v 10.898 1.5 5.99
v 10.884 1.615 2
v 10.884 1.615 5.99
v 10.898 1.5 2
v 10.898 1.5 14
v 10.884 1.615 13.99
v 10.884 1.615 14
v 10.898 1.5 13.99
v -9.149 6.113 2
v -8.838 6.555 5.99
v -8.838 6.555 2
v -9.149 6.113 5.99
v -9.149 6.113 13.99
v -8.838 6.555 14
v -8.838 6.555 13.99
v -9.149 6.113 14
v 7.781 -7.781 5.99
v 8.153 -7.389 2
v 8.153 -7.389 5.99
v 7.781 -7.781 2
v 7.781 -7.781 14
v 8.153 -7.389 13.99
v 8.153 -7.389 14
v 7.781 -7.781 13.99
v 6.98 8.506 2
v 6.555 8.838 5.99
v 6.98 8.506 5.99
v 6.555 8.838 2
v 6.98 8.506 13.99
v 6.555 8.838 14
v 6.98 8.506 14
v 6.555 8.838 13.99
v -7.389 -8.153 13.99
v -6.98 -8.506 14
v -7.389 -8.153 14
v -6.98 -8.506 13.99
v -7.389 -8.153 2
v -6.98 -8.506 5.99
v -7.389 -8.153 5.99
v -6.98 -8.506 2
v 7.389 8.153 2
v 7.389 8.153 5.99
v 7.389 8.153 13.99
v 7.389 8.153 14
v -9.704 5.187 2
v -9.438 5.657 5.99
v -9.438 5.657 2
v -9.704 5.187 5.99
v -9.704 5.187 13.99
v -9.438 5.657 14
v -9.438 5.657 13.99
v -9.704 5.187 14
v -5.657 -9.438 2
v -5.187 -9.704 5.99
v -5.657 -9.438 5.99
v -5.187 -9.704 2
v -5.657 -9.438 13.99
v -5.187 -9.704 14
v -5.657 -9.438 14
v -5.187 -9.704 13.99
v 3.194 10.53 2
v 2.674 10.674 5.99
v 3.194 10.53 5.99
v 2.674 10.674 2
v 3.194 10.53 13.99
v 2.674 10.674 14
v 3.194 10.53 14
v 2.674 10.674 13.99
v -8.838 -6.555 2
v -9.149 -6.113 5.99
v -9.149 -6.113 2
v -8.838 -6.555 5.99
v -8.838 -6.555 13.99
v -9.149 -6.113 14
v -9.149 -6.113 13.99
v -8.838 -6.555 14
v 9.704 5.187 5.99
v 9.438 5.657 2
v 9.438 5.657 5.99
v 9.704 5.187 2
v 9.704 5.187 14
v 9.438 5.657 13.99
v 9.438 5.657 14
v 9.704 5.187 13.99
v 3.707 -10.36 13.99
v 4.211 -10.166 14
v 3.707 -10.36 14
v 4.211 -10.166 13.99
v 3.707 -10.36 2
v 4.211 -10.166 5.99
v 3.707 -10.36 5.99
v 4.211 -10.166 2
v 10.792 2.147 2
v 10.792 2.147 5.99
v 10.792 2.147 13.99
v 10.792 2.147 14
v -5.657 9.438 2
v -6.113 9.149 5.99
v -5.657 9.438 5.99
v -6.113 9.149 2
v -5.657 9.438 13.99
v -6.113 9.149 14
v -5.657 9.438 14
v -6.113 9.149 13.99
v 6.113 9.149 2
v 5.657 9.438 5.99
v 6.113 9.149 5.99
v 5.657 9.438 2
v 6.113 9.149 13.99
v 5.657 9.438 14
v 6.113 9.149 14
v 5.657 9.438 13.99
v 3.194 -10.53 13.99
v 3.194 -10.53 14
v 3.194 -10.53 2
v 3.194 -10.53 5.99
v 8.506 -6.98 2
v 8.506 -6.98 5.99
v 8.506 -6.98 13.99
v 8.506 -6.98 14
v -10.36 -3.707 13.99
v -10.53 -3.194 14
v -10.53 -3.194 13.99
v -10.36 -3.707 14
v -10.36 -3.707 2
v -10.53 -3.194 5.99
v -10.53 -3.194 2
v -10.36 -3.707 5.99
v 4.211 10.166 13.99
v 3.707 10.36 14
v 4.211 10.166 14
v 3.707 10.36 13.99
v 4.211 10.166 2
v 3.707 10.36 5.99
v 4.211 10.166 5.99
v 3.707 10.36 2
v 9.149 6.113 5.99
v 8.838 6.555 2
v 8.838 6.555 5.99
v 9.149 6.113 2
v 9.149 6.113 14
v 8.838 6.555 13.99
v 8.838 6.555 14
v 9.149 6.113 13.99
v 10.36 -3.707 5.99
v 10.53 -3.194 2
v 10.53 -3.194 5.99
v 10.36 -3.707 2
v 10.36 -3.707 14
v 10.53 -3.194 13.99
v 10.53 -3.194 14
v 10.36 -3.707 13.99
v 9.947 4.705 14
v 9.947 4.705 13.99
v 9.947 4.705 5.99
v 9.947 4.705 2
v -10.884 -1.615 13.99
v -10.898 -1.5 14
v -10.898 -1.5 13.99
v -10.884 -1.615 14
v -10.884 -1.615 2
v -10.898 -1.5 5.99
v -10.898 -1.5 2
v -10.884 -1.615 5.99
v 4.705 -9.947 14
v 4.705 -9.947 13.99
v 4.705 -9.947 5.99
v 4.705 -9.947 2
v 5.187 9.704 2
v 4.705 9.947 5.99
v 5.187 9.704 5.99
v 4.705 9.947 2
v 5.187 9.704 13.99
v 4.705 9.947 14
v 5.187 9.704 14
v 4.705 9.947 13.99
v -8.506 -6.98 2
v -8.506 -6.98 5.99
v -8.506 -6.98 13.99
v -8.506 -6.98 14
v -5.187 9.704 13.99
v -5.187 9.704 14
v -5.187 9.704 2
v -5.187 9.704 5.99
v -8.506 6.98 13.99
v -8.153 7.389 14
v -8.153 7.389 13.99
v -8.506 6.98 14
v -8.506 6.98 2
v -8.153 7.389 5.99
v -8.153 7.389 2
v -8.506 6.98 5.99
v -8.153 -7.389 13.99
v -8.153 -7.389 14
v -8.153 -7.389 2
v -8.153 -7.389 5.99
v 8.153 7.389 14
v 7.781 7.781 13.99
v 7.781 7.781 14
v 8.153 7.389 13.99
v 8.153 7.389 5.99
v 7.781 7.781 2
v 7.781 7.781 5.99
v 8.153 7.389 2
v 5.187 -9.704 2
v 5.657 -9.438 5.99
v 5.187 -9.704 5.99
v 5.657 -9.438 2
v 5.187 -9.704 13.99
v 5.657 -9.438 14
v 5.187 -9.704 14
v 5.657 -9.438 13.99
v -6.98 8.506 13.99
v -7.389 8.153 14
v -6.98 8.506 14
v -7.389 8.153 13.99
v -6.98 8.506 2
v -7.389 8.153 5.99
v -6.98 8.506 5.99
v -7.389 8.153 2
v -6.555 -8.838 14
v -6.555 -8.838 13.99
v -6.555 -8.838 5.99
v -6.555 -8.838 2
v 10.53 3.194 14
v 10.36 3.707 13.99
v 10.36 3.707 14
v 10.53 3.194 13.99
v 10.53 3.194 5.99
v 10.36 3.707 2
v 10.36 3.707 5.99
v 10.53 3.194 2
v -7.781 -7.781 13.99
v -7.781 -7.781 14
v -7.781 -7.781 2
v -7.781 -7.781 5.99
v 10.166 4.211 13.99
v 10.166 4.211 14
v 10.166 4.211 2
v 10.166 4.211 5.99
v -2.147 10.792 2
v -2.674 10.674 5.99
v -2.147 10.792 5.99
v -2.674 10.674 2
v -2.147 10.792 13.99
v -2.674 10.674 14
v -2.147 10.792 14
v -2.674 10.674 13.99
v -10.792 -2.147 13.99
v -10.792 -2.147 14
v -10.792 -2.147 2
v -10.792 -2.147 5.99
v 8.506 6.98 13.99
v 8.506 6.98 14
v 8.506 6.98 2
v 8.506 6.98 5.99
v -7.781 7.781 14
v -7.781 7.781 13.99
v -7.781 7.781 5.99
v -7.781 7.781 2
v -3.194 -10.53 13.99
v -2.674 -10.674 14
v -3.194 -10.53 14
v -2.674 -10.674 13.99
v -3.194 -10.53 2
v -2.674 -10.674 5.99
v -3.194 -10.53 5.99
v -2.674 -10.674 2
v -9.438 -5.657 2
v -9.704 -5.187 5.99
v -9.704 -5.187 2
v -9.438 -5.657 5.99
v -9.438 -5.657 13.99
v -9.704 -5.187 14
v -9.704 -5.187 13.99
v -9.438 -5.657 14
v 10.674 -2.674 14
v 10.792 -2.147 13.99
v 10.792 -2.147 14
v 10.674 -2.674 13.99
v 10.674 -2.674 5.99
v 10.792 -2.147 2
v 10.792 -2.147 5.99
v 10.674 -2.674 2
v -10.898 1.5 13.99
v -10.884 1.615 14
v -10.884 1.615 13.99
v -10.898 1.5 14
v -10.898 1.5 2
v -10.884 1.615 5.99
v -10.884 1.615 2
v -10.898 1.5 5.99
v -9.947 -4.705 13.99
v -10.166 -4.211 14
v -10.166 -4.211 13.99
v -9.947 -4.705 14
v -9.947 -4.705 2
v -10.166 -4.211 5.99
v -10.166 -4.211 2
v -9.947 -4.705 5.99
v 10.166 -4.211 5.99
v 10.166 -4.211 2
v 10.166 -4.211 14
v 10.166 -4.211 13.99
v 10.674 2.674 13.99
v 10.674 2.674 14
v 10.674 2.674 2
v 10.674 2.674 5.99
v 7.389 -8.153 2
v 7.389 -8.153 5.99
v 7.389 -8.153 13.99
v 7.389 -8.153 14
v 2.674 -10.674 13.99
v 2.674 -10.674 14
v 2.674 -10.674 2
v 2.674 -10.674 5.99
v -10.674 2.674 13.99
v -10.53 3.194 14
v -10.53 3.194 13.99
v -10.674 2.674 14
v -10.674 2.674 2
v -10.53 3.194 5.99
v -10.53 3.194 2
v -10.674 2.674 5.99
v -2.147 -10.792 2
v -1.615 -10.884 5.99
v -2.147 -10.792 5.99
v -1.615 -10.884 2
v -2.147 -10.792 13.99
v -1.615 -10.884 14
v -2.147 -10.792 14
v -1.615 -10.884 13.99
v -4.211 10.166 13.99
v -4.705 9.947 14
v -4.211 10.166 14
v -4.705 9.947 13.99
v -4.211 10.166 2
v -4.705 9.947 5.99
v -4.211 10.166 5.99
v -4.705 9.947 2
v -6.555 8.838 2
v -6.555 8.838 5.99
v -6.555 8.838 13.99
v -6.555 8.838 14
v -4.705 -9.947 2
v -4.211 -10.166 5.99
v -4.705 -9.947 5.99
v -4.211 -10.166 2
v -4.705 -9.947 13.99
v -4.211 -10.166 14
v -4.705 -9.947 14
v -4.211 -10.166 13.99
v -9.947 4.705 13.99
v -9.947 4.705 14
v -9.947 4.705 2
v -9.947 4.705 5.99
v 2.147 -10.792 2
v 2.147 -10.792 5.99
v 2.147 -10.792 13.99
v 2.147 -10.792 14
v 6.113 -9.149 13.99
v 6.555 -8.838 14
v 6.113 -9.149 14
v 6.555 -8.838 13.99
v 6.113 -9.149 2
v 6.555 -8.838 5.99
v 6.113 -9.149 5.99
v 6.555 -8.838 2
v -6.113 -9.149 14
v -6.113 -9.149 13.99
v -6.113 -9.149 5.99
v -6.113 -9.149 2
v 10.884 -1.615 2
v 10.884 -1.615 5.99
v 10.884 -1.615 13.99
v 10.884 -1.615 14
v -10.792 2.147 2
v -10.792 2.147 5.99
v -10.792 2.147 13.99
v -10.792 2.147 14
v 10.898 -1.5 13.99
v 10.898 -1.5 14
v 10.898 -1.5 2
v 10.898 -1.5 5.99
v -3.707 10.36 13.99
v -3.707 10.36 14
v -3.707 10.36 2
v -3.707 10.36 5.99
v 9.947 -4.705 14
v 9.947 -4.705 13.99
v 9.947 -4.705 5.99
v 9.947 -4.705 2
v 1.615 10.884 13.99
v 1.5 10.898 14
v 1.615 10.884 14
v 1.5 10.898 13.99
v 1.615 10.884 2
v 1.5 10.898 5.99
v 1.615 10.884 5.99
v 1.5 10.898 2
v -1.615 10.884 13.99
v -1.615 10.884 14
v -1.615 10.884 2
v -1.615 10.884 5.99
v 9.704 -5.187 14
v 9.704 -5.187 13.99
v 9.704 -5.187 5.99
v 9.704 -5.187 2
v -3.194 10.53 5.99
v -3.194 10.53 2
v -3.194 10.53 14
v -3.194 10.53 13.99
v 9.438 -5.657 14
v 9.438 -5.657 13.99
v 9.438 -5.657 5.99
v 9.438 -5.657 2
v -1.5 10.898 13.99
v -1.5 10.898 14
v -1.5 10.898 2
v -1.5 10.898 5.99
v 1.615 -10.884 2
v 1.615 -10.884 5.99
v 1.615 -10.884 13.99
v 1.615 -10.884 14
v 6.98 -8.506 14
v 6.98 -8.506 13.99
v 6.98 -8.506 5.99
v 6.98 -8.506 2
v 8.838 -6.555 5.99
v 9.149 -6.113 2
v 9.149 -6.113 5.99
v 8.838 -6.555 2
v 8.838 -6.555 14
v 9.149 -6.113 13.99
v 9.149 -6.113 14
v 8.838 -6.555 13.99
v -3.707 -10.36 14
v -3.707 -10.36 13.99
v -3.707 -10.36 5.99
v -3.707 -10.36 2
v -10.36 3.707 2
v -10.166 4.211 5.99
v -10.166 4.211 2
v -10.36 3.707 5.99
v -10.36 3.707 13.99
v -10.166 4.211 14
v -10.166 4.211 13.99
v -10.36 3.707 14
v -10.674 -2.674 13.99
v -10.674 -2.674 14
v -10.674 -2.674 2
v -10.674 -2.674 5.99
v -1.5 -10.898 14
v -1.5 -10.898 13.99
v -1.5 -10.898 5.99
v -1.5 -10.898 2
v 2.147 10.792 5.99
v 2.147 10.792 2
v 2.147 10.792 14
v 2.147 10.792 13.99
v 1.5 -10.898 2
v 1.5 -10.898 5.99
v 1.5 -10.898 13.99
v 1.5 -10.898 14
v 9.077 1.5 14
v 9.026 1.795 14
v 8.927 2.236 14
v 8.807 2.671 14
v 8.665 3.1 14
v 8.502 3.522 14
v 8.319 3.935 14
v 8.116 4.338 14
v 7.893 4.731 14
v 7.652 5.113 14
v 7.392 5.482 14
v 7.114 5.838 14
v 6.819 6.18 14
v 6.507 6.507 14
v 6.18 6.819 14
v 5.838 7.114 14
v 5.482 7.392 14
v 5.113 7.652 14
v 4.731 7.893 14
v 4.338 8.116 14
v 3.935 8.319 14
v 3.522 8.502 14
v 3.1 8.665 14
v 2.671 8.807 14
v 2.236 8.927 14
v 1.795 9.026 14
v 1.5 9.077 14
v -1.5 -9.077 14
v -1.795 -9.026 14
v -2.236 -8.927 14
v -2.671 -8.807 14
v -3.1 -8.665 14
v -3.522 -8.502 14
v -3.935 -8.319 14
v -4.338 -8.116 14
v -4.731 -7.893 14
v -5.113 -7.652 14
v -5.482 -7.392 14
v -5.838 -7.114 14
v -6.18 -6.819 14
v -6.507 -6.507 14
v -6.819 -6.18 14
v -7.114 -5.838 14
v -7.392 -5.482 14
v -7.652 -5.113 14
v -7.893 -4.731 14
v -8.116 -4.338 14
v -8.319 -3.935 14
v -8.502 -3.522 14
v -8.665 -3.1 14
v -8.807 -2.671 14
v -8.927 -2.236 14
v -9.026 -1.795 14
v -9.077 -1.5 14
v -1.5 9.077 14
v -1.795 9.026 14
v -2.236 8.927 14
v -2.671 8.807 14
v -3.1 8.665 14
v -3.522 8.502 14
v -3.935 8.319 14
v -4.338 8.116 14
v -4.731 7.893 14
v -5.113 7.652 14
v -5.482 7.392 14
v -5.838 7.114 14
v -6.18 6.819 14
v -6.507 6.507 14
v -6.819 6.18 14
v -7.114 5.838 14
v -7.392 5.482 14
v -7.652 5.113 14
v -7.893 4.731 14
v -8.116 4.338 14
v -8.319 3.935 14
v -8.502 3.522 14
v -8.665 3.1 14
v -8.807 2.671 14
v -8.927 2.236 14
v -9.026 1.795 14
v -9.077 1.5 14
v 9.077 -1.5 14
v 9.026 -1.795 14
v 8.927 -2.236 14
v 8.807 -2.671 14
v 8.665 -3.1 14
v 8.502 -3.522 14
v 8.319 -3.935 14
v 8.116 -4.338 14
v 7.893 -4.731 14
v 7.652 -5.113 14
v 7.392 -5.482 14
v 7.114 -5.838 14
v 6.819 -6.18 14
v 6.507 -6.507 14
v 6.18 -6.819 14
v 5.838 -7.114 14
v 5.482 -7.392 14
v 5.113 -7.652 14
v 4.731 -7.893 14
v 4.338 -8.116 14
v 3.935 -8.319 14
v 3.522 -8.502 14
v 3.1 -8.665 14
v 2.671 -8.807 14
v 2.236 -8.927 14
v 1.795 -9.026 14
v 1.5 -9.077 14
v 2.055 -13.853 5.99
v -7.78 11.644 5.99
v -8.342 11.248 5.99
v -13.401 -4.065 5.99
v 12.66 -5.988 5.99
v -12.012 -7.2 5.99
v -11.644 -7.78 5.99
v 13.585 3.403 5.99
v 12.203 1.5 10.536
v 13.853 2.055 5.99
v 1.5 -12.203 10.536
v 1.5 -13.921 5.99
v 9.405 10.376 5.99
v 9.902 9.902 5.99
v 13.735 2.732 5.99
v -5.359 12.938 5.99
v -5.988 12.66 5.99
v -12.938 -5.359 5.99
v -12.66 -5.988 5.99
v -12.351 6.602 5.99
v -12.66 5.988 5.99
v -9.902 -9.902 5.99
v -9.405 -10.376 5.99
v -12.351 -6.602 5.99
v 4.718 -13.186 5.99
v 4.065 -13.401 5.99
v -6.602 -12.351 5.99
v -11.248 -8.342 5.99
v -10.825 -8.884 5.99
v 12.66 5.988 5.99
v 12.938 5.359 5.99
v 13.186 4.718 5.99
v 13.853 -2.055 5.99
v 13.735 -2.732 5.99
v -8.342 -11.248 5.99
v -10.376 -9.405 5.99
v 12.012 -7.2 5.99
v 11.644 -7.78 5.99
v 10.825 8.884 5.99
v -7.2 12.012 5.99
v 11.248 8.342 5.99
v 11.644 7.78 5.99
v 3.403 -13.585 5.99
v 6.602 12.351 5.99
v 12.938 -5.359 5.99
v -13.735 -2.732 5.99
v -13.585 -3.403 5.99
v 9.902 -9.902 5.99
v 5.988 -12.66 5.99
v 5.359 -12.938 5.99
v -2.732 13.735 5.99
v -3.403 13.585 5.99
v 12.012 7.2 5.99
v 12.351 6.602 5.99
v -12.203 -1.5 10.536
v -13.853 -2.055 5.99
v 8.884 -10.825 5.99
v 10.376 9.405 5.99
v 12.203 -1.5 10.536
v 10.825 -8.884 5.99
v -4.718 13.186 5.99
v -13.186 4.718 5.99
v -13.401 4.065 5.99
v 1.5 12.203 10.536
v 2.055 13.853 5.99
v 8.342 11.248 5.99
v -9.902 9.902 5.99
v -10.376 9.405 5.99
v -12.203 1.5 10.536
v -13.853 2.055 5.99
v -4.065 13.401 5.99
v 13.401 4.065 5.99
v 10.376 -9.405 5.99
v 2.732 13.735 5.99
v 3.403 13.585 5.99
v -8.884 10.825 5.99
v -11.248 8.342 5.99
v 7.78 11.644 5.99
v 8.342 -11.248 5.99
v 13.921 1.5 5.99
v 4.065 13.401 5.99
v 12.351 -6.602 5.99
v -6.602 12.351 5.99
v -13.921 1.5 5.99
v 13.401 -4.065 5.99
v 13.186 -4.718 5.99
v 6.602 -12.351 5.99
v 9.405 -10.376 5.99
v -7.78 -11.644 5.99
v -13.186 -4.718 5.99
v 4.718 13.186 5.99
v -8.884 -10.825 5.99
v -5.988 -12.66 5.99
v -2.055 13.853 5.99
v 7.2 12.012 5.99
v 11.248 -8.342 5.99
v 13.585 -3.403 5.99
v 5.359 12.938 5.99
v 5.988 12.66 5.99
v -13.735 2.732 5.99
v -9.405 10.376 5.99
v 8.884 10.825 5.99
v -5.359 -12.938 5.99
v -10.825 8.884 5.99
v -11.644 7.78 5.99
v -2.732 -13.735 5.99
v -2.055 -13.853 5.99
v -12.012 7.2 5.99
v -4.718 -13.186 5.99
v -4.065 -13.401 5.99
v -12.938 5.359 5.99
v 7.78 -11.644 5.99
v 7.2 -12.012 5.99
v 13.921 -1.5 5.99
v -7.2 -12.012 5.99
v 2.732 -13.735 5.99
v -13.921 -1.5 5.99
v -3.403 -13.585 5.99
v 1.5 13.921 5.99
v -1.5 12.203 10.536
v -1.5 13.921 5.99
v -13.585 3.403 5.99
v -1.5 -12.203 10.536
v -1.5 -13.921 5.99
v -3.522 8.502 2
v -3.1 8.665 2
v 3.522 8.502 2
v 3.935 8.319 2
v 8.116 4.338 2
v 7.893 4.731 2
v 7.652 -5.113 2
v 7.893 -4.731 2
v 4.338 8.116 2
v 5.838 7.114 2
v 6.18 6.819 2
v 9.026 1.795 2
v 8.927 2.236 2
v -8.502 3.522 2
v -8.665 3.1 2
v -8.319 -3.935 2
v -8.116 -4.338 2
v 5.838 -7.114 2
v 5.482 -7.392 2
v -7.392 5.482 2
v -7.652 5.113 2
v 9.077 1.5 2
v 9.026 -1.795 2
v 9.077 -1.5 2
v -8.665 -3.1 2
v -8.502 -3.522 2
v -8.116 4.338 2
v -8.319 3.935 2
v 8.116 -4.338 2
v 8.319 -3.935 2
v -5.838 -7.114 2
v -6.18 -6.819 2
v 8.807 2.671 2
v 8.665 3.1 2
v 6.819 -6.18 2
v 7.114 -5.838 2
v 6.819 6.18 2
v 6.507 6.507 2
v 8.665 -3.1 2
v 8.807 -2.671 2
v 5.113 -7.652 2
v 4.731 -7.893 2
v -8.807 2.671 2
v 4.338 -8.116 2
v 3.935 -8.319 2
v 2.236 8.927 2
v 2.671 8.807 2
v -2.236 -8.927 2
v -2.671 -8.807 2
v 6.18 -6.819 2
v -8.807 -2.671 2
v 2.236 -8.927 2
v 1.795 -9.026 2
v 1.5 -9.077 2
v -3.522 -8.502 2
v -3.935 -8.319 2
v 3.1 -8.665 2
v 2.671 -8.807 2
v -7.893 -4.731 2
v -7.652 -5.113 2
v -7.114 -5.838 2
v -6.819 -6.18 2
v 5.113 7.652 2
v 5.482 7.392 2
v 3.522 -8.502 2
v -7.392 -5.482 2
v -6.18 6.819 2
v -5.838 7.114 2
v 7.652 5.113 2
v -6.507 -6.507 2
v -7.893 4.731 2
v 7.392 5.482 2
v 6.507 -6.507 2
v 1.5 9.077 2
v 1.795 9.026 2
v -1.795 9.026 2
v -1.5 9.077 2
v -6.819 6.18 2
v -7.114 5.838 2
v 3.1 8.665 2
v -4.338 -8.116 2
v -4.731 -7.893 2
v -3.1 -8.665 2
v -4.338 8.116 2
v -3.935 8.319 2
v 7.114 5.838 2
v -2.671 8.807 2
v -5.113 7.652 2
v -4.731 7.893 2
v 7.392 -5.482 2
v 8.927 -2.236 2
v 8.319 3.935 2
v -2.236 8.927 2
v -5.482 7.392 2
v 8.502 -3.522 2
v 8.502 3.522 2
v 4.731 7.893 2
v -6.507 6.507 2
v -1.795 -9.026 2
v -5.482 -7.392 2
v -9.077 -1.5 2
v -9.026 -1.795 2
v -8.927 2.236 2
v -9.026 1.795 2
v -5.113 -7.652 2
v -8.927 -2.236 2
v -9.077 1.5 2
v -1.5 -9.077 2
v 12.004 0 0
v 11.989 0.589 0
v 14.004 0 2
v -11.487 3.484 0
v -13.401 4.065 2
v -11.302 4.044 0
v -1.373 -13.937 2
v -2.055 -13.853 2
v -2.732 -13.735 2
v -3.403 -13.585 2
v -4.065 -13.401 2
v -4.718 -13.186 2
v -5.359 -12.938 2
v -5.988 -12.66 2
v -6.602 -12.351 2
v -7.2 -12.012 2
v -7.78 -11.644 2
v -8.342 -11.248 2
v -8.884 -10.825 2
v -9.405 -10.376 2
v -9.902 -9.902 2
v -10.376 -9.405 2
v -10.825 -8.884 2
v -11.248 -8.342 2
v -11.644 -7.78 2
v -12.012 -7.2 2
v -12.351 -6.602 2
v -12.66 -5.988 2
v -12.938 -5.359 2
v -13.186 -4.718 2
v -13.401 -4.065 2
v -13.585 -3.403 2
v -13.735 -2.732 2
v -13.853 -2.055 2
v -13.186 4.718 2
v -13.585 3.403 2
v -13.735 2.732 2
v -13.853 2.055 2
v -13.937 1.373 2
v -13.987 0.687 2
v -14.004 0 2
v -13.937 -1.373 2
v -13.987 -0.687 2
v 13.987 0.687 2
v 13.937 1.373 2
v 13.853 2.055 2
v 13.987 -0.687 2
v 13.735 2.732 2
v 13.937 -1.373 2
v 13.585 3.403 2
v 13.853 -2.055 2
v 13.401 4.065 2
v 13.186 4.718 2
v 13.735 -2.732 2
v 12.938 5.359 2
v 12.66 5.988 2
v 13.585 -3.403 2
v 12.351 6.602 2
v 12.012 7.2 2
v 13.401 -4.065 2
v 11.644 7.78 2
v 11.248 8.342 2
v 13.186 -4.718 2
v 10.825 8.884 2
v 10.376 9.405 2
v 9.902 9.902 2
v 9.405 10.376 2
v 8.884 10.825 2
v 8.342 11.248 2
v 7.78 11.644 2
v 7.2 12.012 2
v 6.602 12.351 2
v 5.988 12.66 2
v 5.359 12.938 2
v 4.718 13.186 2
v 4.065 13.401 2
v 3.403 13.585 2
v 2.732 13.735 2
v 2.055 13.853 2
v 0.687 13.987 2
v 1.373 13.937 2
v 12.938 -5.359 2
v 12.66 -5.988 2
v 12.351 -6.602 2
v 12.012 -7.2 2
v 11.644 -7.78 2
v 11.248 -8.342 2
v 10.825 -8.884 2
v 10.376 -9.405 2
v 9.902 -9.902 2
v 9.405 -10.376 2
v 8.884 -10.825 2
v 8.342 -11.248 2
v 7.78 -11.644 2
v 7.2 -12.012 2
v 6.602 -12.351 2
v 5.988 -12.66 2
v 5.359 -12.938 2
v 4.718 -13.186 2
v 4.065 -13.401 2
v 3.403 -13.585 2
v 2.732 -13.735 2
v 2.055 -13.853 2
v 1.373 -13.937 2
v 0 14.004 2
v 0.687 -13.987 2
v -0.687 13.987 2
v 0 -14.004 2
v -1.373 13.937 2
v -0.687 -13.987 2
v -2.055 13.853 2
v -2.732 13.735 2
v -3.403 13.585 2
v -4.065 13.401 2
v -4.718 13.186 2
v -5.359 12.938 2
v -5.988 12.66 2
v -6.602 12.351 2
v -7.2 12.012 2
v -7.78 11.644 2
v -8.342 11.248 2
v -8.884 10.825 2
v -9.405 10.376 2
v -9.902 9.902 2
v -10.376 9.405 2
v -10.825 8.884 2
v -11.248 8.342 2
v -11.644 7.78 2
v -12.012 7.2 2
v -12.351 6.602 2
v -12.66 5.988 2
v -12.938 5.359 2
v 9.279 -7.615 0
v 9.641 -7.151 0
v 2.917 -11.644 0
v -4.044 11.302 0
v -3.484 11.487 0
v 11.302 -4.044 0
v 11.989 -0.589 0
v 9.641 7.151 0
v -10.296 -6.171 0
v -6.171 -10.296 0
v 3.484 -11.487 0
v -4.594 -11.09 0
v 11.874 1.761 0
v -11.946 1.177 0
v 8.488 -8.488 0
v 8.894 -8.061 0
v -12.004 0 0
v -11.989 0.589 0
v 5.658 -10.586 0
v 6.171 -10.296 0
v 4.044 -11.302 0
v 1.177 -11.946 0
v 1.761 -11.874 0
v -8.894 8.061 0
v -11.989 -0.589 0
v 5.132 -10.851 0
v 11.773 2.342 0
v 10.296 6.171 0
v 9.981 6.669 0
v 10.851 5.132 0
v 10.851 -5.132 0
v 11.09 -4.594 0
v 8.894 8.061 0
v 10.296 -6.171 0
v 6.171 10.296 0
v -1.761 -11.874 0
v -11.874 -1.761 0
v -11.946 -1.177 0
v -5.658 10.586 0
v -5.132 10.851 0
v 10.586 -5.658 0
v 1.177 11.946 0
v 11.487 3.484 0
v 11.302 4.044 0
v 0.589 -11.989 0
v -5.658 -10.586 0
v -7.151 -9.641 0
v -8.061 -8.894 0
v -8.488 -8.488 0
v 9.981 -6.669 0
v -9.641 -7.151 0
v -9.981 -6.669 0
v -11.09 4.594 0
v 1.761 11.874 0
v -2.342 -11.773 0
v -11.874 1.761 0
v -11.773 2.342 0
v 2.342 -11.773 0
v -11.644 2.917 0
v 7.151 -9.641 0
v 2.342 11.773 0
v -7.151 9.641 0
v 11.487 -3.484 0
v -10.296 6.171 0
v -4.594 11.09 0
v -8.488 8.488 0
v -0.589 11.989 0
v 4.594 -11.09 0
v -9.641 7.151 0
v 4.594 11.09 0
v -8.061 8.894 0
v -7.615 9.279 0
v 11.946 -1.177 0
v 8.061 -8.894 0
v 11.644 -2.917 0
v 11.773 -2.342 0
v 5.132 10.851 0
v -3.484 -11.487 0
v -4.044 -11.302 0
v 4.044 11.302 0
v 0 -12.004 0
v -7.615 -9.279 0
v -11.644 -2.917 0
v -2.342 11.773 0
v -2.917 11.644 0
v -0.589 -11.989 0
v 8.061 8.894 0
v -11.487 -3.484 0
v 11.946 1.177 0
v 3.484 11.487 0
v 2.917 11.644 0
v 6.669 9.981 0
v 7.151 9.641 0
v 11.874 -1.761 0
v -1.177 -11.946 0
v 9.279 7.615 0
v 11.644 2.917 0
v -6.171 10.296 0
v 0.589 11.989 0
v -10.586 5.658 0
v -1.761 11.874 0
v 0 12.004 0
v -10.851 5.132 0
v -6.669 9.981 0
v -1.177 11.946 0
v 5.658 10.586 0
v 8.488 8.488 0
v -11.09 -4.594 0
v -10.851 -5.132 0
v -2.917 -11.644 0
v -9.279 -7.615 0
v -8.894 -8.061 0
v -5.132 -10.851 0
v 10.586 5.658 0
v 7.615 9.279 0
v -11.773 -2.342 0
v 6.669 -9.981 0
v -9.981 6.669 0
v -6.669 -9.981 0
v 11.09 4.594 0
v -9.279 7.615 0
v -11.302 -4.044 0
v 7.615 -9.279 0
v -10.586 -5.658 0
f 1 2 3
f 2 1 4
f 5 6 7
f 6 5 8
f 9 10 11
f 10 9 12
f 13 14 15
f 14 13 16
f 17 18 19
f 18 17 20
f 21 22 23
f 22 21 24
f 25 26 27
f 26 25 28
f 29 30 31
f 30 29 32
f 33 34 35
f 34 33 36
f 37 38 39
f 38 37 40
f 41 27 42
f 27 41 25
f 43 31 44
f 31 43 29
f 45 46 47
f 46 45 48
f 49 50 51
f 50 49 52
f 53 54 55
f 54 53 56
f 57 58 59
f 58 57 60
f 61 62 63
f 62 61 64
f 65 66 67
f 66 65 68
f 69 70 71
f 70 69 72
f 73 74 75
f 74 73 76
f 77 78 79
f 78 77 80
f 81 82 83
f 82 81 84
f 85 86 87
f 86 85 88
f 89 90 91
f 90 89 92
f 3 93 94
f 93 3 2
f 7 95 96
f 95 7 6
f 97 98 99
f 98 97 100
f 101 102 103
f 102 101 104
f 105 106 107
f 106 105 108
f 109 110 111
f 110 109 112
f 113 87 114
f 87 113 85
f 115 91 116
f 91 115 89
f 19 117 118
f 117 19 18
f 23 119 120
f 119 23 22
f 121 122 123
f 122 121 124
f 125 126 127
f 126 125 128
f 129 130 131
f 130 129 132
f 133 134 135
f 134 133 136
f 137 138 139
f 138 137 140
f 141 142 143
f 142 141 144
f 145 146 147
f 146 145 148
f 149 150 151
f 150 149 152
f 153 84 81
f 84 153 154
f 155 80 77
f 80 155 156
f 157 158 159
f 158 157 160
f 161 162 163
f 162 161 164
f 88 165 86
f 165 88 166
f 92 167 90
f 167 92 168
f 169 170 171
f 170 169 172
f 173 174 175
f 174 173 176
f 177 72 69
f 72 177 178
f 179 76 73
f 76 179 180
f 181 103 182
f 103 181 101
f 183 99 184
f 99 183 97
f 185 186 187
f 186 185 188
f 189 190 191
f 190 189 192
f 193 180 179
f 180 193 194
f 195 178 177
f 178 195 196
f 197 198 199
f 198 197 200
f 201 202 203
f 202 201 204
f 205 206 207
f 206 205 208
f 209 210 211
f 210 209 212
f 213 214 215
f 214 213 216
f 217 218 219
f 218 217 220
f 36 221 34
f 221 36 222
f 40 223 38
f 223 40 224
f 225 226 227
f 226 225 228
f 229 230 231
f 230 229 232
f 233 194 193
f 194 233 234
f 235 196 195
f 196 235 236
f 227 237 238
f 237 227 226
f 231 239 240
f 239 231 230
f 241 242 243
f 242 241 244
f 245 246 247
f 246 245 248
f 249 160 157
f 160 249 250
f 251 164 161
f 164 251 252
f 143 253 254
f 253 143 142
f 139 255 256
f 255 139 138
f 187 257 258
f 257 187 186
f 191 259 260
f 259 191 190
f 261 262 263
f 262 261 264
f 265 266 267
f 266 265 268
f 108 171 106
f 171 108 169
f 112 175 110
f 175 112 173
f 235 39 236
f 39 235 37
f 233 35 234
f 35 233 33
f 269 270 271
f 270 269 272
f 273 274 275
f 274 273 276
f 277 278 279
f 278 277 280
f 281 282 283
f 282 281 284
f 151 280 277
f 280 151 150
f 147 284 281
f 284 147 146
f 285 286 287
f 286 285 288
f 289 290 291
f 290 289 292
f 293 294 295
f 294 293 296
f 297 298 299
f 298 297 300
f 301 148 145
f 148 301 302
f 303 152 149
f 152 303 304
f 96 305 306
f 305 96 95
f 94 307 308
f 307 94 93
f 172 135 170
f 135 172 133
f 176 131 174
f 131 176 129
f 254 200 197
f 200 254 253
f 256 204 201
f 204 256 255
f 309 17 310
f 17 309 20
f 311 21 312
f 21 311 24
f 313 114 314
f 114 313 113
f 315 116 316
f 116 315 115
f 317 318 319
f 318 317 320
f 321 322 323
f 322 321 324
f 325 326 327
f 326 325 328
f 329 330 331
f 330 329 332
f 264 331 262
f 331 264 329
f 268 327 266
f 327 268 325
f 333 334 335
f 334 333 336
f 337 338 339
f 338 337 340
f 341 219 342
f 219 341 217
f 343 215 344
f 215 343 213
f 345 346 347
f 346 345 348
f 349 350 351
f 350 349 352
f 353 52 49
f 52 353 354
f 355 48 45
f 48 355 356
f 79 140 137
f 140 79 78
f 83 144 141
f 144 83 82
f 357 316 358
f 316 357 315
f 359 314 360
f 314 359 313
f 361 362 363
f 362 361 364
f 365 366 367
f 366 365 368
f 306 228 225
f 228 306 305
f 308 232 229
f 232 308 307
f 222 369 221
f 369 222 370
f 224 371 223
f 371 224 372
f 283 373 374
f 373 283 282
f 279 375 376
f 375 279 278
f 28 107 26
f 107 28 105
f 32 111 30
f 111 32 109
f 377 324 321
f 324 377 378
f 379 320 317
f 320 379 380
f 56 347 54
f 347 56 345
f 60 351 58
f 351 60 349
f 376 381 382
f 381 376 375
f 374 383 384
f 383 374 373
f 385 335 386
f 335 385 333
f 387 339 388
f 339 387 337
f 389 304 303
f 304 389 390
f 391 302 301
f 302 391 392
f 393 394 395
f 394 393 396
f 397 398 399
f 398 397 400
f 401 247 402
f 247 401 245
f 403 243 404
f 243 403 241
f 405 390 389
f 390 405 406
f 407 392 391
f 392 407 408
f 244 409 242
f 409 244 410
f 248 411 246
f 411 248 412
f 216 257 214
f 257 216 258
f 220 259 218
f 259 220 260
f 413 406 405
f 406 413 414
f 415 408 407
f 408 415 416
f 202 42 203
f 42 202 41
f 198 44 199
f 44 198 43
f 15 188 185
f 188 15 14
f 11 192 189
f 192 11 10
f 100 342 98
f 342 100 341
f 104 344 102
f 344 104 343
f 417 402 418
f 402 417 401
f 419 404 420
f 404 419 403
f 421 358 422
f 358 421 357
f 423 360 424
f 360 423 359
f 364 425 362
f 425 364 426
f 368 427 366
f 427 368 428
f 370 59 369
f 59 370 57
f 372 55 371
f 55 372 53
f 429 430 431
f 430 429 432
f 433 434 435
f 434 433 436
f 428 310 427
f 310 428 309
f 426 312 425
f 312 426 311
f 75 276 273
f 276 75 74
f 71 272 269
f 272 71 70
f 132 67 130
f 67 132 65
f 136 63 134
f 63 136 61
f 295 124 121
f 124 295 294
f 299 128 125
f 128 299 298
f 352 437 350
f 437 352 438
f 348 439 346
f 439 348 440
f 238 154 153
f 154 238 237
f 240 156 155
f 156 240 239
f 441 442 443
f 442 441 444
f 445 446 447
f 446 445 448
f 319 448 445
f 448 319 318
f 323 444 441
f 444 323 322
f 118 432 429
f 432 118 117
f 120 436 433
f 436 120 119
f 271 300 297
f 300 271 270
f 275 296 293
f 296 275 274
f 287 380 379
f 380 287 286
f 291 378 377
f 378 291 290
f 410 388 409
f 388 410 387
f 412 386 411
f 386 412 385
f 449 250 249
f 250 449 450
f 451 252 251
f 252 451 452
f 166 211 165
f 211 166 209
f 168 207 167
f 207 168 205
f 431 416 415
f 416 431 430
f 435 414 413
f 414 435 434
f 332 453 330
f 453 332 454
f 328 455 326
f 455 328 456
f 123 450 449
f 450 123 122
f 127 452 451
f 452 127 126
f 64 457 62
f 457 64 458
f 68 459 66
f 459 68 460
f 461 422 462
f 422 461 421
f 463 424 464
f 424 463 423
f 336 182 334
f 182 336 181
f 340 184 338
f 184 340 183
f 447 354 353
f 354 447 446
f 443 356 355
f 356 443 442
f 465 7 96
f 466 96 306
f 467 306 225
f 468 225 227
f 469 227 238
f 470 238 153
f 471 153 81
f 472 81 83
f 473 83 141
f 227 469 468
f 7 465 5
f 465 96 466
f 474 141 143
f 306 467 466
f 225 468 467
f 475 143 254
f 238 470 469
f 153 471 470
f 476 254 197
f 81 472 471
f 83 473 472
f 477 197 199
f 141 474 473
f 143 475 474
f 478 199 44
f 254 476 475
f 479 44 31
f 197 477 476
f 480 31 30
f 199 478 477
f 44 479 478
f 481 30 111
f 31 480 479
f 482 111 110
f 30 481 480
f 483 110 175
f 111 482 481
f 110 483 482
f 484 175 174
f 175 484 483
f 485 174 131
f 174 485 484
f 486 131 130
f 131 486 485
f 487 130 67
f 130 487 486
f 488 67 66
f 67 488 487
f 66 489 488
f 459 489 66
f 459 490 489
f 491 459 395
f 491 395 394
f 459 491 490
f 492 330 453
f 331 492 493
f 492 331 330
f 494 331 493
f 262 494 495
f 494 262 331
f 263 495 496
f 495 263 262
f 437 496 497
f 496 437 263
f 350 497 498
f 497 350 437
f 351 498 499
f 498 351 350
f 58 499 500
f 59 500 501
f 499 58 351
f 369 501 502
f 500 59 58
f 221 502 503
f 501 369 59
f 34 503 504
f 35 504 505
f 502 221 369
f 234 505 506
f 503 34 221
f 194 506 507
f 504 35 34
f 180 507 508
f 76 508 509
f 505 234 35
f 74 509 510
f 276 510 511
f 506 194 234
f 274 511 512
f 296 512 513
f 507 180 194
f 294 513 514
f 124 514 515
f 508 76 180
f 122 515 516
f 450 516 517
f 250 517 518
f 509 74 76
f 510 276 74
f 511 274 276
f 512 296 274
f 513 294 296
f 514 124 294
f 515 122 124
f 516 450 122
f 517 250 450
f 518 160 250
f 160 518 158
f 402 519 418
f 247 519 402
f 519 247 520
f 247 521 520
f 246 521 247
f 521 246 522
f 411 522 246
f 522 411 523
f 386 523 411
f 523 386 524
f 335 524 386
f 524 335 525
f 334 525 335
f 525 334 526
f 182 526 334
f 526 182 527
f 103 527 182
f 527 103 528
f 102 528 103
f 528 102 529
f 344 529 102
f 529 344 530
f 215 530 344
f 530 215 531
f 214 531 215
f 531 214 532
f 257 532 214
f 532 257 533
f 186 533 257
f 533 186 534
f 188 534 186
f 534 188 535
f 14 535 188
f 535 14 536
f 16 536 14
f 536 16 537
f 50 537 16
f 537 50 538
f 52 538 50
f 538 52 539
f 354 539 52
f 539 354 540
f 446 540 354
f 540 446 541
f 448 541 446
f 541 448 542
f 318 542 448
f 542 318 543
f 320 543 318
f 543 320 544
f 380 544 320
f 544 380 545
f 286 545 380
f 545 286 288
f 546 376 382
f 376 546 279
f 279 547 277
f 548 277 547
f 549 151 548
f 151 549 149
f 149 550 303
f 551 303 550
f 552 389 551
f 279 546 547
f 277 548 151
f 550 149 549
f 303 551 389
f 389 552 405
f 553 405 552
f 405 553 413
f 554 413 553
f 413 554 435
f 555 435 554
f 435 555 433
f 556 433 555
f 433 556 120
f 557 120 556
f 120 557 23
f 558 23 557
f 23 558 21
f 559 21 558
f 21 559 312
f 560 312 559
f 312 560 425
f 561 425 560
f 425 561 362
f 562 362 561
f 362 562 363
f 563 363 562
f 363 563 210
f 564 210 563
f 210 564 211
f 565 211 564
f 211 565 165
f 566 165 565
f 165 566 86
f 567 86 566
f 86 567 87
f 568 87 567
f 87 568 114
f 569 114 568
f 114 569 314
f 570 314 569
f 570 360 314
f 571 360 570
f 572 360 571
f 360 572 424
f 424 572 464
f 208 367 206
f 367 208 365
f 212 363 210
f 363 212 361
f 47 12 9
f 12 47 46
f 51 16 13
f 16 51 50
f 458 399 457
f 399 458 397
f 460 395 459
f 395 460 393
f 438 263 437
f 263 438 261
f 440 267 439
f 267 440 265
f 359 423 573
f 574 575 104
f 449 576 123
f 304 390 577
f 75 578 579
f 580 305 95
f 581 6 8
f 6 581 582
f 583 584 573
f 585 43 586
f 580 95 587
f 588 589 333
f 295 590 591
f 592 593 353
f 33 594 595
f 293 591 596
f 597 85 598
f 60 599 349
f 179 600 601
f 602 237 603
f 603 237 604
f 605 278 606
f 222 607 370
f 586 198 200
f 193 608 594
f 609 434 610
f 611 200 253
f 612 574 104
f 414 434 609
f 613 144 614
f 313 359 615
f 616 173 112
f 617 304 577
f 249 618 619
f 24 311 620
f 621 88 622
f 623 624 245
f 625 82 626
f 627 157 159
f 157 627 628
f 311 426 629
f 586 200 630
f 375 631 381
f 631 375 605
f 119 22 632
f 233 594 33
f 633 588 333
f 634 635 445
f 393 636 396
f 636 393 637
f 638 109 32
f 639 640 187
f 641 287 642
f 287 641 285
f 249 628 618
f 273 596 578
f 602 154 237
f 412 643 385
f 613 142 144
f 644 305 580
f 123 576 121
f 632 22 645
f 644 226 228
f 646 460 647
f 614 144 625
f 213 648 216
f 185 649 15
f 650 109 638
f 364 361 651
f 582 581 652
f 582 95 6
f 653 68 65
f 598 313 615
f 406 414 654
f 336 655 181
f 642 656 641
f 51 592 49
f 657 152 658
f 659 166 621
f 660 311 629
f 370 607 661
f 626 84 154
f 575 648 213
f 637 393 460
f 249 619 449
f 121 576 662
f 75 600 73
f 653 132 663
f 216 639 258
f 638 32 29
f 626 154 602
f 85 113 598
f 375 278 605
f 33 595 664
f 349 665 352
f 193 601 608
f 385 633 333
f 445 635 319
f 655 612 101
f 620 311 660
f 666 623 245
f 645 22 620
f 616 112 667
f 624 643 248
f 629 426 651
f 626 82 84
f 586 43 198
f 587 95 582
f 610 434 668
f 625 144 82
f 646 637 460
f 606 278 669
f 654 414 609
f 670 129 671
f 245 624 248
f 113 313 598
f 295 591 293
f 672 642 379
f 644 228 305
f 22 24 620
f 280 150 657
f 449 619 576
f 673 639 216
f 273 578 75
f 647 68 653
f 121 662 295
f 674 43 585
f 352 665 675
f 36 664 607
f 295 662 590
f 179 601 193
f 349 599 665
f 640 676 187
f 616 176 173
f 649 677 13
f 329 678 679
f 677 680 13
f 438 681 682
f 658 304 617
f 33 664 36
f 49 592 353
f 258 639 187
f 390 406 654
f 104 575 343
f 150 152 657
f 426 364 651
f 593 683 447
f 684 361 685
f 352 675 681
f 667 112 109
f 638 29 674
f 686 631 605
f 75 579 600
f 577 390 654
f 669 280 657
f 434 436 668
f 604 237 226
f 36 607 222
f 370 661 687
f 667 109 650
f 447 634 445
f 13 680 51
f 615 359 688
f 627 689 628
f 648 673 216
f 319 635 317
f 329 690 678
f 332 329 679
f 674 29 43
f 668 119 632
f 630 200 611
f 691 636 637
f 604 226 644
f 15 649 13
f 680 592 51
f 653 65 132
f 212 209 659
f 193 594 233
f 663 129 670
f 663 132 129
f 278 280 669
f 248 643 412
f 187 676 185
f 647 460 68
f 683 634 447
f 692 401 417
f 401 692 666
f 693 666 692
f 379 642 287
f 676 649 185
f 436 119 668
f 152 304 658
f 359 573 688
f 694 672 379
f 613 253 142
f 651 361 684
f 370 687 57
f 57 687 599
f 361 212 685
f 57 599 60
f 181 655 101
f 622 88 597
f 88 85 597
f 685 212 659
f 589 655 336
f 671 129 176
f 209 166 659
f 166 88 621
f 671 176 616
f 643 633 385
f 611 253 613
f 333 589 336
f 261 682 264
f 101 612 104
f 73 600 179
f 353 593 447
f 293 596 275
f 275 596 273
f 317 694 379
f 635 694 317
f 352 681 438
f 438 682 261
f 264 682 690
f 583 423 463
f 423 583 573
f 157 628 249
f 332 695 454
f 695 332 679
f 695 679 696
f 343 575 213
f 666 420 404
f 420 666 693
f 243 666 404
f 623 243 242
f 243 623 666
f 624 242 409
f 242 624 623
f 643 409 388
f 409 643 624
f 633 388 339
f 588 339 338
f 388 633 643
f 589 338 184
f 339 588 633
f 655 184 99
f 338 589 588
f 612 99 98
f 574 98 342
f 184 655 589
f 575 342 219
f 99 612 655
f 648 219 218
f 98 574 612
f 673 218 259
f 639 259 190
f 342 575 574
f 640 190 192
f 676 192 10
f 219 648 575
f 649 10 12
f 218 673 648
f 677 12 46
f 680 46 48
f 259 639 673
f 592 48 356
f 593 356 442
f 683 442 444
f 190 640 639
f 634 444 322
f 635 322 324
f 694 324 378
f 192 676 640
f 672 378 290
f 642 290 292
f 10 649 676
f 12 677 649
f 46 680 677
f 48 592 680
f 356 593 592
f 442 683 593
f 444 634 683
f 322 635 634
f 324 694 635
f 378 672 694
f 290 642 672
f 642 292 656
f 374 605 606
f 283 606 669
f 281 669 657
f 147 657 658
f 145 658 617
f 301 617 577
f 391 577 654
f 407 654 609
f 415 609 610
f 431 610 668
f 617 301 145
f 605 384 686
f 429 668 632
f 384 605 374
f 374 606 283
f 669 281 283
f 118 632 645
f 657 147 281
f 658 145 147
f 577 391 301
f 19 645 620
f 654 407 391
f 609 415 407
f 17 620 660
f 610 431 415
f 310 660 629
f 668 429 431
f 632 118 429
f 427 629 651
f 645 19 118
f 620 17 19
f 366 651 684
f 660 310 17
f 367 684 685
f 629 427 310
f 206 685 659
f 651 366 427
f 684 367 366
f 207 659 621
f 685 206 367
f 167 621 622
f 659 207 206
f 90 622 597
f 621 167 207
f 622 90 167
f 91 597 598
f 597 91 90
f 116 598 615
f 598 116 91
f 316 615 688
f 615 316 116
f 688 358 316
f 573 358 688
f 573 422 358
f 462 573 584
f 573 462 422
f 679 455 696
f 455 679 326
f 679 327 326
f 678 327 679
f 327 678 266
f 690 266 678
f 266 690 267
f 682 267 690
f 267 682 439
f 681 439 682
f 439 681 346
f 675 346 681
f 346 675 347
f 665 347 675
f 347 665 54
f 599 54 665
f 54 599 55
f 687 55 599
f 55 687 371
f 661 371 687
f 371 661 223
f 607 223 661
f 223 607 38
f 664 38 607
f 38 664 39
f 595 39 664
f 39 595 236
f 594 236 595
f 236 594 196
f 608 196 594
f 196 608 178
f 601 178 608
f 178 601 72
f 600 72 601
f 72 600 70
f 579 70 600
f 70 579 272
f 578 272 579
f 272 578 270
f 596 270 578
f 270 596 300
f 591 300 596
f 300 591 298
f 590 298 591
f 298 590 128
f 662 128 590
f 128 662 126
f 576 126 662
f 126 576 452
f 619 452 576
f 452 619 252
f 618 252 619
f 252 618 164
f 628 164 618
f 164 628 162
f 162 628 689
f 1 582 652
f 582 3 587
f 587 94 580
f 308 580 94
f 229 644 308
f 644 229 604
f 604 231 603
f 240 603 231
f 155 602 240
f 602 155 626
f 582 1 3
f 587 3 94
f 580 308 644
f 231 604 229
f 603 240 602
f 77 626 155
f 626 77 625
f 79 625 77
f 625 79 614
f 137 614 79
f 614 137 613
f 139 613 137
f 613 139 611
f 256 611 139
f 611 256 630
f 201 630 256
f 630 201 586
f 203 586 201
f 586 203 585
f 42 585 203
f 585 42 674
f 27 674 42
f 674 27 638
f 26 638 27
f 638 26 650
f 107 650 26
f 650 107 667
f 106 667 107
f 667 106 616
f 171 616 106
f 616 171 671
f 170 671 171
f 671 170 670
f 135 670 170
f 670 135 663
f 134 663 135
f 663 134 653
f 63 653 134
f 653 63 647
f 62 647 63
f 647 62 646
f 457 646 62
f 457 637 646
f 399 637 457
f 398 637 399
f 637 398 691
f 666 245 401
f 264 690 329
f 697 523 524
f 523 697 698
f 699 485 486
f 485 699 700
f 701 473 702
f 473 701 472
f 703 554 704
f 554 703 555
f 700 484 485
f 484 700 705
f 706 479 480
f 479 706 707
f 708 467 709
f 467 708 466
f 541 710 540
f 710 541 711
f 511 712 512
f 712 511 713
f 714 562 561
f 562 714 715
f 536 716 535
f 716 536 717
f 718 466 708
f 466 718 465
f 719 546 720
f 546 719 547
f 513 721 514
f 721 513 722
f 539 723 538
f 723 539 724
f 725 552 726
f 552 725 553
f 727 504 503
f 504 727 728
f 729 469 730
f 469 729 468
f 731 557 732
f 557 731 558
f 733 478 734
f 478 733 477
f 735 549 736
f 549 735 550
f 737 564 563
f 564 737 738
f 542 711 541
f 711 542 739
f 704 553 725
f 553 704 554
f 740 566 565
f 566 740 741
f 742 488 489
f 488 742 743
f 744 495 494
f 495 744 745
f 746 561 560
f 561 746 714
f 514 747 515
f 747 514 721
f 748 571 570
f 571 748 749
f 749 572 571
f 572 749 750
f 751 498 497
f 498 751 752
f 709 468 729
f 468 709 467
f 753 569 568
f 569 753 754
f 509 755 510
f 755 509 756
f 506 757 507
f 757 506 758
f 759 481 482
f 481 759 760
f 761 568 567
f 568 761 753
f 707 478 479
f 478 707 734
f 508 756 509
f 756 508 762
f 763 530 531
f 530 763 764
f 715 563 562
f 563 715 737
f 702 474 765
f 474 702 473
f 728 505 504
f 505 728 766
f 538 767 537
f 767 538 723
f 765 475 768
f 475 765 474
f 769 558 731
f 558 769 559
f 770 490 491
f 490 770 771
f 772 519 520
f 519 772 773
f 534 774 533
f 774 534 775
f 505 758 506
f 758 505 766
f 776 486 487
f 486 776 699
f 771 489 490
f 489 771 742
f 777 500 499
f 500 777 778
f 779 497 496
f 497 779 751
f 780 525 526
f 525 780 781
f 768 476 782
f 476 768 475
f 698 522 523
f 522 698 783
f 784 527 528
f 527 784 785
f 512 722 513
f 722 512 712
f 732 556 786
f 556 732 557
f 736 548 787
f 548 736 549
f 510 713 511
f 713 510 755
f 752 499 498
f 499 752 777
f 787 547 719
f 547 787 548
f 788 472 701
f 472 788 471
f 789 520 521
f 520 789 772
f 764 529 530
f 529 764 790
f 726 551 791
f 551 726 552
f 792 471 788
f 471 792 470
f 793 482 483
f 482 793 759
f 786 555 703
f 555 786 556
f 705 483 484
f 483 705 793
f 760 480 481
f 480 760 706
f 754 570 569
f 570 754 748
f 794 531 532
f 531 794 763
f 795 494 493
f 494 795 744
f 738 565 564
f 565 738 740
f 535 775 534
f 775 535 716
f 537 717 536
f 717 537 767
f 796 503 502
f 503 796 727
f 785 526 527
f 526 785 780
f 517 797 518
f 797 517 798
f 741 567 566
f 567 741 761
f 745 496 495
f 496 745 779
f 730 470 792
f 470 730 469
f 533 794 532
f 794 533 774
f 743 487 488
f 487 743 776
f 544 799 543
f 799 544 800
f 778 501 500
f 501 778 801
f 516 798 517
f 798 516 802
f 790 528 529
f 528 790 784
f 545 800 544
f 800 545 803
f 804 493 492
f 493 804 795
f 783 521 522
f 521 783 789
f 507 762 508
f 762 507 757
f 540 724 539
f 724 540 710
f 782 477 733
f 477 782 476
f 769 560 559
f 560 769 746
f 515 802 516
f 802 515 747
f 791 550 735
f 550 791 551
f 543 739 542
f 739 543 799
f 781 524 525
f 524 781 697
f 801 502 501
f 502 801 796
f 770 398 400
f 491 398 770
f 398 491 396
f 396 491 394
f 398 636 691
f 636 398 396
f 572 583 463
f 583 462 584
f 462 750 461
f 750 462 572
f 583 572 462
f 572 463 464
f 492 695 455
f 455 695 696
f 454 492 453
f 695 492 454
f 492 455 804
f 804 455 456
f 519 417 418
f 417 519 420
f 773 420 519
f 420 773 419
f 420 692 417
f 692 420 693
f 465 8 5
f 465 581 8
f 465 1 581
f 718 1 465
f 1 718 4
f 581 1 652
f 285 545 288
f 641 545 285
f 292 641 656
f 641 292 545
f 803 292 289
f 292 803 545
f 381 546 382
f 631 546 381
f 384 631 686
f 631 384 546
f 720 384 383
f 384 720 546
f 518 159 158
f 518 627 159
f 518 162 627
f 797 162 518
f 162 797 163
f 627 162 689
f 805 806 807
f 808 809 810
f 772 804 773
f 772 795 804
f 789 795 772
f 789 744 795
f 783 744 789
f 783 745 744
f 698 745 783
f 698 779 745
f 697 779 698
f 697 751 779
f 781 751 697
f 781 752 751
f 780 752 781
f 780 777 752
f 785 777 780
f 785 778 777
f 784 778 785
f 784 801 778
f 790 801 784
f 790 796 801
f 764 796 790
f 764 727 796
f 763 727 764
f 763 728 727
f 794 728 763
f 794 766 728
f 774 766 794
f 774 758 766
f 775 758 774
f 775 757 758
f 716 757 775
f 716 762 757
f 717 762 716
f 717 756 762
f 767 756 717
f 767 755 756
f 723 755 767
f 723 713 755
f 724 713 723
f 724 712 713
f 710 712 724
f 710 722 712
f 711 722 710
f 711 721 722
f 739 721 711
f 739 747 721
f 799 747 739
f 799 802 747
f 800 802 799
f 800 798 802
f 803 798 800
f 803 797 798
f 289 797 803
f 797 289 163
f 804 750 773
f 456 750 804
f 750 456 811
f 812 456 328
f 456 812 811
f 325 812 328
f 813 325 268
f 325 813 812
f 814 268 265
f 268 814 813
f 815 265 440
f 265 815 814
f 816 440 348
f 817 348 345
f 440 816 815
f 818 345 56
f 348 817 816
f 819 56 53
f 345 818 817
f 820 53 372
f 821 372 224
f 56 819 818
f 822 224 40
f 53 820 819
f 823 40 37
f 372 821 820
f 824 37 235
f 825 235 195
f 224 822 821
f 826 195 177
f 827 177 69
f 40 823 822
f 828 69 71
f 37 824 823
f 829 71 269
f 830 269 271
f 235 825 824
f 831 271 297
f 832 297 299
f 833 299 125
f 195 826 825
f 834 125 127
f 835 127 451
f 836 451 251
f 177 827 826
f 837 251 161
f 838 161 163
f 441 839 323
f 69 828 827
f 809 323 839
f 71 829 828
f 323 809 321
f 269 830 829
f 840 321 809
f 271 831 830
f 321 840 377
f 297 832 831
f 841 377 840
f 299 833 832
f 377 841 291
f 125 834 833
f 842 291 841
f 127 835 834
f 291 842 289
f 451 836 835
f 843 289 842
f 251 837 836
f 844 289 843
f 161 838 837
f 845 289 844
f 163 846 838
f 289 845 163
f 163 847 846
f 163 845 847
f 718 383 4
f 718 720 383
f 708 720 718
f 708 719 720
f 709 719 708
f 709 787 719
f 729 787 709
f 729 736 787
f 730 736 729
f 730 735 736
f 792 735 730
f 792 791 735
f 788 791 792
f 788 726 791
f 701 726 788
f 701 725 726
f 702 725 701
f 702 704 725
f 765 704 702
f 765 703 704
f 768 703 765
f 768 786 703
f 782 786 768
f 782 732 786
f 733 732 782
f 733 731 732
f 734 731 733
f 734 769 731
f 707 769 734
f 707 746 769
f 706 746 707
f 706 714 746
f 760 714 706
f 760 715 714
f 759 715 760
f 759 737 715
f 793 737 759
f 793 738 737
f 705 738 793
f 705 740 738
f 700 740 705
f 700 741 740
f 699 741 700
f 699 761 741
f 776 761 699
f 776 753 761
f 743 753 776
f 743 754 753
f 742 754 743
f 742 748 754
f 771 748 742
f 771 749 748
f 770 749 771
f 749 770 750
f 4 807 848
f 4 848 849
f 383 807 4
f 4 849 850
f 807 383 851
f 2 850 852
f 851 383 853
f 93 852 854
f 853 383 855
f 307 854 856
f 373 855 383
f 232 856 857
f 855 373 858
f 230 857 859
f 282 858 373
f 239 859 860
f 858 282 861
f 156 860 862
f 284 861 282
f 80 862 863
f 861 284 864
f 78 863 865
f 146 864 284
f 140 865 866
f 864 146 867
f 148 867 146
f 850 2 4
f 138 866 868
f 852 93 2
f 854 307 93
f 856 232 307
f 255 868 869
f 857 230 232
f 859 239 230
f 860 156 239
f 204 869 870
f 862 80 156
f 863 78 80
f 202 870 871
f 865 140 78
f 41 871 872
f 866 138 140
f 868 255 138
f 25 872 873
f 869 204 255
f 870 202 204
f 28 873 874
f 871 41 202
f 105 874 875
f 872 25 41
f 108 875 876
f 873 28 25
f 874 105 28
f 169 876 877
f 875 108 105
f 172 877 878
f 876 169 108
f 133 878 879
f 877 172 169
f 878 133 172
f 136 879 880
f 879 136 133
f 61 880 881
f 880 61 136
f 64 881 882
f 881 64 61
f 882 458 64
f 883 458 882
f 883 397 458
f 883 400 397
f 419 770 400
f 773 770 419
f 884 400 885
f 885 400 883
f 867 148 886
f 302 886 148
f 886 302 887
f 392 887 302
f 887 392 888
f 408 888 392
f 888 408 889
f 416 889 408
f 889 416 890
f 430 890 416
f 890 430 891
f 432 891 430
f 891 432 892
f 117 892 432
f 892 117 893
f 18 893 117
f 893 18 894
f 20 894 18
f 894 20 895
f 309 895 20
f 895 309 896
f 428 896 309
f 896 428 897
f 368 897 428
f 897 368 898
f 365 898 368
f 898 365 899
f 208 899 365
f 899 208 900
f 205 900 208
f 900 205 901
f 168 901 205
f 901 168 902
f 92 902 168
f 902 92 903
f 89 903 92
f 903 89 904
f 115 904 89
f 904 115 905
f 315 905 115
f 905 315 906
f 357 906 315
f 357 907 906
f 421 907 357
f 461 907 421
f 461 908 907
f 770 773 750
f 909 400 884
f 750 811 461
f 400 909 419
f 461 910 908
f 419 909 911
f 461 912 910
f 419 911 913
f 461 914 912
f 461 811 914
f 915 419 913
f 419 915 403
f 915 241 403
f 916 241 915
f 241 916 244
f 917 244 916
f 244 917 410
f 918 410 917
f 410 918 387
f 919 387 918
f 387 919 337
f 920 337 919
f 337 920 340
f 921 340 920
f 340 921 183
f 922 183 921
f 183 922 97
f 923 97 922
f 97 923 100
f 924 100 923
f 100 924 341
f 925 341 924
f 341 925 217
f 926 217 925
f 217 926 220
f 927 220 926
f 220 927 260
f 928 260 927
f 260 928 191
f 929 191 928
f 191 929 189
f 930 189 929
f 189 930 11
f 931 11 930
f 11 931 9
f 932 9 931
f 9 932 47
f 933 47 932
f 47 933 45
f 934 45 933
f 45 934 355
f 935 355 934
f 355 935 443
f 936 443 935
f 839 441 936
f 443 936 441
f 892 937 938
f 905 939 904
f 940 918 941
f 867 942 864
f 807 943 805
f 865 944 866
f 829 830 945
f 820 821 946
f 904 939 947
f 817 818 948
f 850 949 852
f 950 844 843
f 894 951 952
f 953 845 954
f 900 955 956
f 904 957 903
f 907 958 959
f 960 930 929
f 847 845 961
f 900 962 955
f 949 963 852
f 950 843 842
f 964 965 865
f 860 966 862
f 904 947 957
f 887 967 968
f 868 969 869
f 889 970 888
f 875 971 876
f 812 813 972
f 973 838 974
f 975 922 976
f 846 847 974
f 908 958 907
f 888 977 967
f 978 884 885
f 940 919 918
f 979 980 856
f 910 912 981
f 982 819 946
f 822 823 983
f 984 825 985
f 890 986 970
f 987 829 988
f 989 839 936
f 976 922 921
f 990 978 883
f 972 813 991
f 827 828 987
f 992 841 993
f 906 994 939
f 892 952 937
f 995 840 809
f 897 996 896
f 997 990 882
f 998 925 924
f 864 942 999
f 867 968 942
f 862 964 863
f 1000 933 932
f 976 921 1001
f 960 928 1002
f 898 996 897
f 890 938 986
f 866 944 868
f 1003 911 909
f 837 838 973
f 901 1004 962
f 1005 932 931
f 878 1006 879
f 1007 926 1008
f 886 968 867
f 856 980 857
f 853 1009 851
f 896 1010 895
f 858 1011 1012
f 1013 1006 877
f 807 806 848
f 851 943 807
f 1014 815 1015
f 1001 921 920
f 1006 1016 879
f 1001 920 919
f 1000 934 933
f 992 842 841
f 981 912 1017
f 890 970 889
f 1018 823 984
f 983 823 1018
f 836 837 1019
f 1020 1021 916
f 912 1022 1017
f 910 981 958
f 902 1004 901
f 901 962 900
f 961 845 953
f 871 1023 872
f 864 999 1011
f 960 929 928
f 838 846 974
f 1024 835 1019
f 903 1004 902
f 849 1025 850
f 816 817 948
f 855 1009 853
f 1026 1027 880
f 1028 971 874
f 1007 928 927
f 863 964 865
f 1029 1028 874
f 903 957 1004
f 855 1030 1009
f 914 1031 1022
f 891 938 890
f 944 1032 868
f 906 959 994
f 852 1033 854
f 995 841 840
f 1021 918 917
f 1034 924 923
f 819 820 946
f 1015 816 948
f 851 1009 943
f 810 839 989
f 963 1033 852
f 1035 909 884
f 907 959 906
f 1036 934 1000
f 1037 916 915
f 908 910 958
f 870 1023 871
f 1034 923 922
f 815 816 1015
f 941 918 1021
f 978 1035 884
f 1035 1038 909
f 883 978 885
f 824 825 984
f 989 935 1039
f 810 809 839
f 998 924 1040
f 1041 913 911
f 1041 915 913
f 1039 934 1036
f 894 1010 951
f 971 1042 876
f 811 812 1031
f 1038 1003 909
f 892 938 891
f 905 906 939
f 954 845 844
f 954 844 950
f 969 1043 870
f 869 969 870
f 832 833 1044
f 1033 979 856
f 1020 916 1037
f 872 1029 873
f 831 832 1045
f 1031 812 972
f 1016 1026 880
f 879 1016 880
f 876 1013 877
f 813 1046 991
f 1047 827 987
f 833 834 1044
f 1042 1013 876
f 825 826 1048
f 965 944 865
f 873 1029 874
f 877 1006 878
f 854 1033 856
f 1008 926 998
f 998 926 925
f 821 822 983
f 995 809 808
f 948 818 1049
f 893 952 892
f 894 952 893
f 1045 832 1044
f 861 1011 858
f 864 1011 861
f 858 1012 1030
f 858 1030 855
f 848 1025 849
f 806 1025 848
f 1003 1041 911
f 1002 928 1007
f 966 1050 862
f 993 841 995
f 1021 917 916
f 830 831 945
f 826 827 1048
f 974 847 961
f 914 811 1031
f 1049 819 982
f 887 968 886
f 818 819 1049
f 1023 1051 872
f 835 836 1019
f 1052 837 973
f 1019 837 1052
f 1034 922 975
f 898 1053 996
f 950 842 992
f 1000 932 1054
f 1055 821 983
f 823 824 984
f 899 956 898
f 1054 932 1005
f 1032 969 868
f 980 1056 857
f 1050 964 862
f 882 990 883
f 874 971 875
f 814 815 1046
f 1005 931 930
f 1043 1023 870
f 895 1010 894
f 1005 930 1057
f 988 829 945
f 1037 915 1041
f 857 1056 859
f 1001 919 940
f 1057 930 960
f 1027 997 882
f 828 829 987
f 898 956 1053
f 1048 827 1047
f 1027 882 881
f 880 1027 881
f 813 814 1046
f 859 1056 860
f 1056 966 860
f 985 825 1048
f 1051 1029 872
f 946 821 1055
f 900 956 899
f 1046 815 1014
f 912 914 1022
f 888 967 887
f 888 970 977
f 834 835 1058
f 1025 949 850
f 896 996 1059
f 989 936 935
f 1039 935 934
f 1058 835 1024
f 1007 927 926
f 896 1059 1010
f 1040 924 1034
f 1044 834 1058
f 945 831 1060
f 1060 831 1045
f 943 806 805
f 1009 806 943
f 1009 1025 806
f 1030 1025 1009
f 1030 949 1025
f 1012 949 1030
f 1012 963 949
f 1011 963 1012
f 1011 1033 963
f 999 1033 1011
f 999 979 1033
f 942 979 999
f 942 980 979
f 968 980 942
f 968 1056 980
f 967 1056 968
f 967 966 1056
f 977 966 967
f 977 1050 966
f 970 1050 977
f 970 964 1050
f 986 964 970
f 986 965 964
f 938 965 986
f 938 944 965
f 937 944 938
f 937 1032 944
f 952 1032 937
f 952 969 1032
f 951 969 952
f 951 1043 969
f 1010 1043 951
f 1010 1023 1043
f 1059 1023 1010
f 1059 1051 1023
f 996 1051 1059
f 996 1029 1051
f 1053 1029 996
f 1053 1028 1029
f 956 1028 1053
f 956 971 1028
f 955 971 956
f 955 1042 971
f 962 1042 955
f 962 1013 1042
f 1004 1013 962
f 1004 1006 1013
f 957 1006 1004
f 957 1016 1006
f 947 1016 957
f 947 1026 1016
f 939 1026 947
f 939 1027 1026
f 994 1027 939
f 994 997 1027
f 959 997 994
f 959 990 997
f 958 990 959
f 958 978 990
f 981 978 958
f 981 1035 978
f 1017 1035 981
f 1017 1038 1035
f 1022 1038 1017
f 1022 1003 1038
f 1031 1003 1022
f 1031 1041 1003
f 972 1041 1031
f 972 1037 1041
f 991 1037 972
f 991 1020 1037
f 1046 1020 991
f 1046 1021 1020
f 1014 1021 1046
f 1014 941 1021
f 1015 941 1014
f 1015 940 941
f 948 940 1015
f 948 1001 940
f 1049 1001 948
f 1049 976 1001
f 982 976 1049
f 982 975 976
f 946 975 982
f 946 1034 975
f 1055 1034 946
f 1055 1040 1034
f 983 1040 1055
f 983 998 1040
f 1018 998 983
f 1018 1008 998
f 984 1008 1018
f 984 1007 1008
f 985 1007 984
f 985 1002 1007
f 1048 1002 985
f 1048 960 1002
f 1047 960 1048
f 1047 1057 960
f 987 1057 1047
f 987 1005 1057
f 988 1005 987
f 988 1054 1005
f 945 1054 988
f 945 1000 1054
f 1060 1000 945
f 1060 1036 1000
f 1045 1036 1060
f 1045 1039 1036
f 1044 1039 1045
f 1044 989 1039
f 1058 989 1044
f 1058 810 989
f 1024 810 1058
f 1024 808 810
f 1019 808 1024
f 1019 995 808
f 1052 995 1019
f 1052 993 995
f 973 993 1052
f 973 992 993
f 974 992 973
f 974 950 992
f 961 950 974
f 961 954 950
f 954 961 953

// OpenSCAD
panel_hole_diameter = 22;
head_diameter = panel_hole_diameter + 2;
head_thickness = 2;
panel_thickness = 4;
sparse_barbs = false;
barb_height = 8;
barb_len = 3;
sparse_barb_width = 5;
dense_barb_gap = 3;
wall = 1.8;
fn = 128;
slop = 0.01;

module cylinder_outer(height, radius, fn) {
  fudge = 1 / cos(180 / fn);
  cylinder(h=height, r=radius * fudge, $fn=fn);
}

module cone_outer(height, radius1, radius2, fn) {
  fudge = 1 / cos(180 / fn);
  cylinder(h=height, r1=radius1 * fudge, r2=radius2 * fudge, $fn=fn);
}

cone_outer(height=head_thickness, radius1=head_diameter / 2, radius2=head_diameter / 2 + head_thickness, fn=fn);
intersection() {
  translate([0, 0, head_thickness - slop]) {
    difference() {
      union() {
        cylinder_outer(height=panel_thickness + barb_height + slop, radius=panel_hole_diameter / 2, fn=fn);
        translate([0, 0, panel_thickness]) {
          cone_outer(height=barb_height, radius1=panel_hole_diameter / 2 + barb_len, radius2=panel_hole_diameter / 2, fn=fn);
        }
      }
      cylinder_outer(height=panel_thickness + barb_height + slop * 2, radius=panel_hole_diameter / 2 - wall, fn=fn);
    }
  }
  union() {
    if (sparse_barbs) {
      translate(
        [
          -sparse_barb_width / 2,
          -(panel_hole_diameter + barb_len) / 2,
          0,
        ]
      ) cube(size=[sparse_barb_width, panel_hole_diameter + barb_len * 2, head_thickness + panel_thickness + barb_height]);

      translate(
        [
          -(panel_hole_diameter + barb_len) / 2,
          -sparse_barb_width / 2,
          0,
        ]
      ) cube(size=[panel_hole_diameter + barb_len * 2, sparse_barb_width, head_thickness + panel_thickness + barb_height]);
    } else {
      translate(
        [
          -(panel_hole_diameter + barb_len * 2) / 2,
          -(panel_hole_diameter + barb_len * 2) / 2,
          0,
        ]
      ) difference() {
          cube(
            [
              panel_hole_diameter + barb_len * 2,
              panel_hole_diameter + barb_len * 2,
              head_thickness + panel_thickness + barb_height,
            ]
          );
          translate(
            [
              (panel_hole_diameter + barb_len * 2 - dense_barb_gap) / 2,
              0,
            ]
          ) cube(
              [
                dense_barb_gap,
                panel_hole_diameter + barb_len * 2,
                head_thickness + panel_thickness + barb_height + slop,
              ]
            );
          translate(
            [
              0,
              (panel_hole_diameter + barb_len * 2 - dense_barb_gap) / 2,
            ]
          ) cube(
              [
                panel_hole_diameter + barb_len * 2,
                dense_barb_gap,
                head_thickness + panel_thickness + barb_height + slop,
              ]
            );
        }
    }
  }
}
